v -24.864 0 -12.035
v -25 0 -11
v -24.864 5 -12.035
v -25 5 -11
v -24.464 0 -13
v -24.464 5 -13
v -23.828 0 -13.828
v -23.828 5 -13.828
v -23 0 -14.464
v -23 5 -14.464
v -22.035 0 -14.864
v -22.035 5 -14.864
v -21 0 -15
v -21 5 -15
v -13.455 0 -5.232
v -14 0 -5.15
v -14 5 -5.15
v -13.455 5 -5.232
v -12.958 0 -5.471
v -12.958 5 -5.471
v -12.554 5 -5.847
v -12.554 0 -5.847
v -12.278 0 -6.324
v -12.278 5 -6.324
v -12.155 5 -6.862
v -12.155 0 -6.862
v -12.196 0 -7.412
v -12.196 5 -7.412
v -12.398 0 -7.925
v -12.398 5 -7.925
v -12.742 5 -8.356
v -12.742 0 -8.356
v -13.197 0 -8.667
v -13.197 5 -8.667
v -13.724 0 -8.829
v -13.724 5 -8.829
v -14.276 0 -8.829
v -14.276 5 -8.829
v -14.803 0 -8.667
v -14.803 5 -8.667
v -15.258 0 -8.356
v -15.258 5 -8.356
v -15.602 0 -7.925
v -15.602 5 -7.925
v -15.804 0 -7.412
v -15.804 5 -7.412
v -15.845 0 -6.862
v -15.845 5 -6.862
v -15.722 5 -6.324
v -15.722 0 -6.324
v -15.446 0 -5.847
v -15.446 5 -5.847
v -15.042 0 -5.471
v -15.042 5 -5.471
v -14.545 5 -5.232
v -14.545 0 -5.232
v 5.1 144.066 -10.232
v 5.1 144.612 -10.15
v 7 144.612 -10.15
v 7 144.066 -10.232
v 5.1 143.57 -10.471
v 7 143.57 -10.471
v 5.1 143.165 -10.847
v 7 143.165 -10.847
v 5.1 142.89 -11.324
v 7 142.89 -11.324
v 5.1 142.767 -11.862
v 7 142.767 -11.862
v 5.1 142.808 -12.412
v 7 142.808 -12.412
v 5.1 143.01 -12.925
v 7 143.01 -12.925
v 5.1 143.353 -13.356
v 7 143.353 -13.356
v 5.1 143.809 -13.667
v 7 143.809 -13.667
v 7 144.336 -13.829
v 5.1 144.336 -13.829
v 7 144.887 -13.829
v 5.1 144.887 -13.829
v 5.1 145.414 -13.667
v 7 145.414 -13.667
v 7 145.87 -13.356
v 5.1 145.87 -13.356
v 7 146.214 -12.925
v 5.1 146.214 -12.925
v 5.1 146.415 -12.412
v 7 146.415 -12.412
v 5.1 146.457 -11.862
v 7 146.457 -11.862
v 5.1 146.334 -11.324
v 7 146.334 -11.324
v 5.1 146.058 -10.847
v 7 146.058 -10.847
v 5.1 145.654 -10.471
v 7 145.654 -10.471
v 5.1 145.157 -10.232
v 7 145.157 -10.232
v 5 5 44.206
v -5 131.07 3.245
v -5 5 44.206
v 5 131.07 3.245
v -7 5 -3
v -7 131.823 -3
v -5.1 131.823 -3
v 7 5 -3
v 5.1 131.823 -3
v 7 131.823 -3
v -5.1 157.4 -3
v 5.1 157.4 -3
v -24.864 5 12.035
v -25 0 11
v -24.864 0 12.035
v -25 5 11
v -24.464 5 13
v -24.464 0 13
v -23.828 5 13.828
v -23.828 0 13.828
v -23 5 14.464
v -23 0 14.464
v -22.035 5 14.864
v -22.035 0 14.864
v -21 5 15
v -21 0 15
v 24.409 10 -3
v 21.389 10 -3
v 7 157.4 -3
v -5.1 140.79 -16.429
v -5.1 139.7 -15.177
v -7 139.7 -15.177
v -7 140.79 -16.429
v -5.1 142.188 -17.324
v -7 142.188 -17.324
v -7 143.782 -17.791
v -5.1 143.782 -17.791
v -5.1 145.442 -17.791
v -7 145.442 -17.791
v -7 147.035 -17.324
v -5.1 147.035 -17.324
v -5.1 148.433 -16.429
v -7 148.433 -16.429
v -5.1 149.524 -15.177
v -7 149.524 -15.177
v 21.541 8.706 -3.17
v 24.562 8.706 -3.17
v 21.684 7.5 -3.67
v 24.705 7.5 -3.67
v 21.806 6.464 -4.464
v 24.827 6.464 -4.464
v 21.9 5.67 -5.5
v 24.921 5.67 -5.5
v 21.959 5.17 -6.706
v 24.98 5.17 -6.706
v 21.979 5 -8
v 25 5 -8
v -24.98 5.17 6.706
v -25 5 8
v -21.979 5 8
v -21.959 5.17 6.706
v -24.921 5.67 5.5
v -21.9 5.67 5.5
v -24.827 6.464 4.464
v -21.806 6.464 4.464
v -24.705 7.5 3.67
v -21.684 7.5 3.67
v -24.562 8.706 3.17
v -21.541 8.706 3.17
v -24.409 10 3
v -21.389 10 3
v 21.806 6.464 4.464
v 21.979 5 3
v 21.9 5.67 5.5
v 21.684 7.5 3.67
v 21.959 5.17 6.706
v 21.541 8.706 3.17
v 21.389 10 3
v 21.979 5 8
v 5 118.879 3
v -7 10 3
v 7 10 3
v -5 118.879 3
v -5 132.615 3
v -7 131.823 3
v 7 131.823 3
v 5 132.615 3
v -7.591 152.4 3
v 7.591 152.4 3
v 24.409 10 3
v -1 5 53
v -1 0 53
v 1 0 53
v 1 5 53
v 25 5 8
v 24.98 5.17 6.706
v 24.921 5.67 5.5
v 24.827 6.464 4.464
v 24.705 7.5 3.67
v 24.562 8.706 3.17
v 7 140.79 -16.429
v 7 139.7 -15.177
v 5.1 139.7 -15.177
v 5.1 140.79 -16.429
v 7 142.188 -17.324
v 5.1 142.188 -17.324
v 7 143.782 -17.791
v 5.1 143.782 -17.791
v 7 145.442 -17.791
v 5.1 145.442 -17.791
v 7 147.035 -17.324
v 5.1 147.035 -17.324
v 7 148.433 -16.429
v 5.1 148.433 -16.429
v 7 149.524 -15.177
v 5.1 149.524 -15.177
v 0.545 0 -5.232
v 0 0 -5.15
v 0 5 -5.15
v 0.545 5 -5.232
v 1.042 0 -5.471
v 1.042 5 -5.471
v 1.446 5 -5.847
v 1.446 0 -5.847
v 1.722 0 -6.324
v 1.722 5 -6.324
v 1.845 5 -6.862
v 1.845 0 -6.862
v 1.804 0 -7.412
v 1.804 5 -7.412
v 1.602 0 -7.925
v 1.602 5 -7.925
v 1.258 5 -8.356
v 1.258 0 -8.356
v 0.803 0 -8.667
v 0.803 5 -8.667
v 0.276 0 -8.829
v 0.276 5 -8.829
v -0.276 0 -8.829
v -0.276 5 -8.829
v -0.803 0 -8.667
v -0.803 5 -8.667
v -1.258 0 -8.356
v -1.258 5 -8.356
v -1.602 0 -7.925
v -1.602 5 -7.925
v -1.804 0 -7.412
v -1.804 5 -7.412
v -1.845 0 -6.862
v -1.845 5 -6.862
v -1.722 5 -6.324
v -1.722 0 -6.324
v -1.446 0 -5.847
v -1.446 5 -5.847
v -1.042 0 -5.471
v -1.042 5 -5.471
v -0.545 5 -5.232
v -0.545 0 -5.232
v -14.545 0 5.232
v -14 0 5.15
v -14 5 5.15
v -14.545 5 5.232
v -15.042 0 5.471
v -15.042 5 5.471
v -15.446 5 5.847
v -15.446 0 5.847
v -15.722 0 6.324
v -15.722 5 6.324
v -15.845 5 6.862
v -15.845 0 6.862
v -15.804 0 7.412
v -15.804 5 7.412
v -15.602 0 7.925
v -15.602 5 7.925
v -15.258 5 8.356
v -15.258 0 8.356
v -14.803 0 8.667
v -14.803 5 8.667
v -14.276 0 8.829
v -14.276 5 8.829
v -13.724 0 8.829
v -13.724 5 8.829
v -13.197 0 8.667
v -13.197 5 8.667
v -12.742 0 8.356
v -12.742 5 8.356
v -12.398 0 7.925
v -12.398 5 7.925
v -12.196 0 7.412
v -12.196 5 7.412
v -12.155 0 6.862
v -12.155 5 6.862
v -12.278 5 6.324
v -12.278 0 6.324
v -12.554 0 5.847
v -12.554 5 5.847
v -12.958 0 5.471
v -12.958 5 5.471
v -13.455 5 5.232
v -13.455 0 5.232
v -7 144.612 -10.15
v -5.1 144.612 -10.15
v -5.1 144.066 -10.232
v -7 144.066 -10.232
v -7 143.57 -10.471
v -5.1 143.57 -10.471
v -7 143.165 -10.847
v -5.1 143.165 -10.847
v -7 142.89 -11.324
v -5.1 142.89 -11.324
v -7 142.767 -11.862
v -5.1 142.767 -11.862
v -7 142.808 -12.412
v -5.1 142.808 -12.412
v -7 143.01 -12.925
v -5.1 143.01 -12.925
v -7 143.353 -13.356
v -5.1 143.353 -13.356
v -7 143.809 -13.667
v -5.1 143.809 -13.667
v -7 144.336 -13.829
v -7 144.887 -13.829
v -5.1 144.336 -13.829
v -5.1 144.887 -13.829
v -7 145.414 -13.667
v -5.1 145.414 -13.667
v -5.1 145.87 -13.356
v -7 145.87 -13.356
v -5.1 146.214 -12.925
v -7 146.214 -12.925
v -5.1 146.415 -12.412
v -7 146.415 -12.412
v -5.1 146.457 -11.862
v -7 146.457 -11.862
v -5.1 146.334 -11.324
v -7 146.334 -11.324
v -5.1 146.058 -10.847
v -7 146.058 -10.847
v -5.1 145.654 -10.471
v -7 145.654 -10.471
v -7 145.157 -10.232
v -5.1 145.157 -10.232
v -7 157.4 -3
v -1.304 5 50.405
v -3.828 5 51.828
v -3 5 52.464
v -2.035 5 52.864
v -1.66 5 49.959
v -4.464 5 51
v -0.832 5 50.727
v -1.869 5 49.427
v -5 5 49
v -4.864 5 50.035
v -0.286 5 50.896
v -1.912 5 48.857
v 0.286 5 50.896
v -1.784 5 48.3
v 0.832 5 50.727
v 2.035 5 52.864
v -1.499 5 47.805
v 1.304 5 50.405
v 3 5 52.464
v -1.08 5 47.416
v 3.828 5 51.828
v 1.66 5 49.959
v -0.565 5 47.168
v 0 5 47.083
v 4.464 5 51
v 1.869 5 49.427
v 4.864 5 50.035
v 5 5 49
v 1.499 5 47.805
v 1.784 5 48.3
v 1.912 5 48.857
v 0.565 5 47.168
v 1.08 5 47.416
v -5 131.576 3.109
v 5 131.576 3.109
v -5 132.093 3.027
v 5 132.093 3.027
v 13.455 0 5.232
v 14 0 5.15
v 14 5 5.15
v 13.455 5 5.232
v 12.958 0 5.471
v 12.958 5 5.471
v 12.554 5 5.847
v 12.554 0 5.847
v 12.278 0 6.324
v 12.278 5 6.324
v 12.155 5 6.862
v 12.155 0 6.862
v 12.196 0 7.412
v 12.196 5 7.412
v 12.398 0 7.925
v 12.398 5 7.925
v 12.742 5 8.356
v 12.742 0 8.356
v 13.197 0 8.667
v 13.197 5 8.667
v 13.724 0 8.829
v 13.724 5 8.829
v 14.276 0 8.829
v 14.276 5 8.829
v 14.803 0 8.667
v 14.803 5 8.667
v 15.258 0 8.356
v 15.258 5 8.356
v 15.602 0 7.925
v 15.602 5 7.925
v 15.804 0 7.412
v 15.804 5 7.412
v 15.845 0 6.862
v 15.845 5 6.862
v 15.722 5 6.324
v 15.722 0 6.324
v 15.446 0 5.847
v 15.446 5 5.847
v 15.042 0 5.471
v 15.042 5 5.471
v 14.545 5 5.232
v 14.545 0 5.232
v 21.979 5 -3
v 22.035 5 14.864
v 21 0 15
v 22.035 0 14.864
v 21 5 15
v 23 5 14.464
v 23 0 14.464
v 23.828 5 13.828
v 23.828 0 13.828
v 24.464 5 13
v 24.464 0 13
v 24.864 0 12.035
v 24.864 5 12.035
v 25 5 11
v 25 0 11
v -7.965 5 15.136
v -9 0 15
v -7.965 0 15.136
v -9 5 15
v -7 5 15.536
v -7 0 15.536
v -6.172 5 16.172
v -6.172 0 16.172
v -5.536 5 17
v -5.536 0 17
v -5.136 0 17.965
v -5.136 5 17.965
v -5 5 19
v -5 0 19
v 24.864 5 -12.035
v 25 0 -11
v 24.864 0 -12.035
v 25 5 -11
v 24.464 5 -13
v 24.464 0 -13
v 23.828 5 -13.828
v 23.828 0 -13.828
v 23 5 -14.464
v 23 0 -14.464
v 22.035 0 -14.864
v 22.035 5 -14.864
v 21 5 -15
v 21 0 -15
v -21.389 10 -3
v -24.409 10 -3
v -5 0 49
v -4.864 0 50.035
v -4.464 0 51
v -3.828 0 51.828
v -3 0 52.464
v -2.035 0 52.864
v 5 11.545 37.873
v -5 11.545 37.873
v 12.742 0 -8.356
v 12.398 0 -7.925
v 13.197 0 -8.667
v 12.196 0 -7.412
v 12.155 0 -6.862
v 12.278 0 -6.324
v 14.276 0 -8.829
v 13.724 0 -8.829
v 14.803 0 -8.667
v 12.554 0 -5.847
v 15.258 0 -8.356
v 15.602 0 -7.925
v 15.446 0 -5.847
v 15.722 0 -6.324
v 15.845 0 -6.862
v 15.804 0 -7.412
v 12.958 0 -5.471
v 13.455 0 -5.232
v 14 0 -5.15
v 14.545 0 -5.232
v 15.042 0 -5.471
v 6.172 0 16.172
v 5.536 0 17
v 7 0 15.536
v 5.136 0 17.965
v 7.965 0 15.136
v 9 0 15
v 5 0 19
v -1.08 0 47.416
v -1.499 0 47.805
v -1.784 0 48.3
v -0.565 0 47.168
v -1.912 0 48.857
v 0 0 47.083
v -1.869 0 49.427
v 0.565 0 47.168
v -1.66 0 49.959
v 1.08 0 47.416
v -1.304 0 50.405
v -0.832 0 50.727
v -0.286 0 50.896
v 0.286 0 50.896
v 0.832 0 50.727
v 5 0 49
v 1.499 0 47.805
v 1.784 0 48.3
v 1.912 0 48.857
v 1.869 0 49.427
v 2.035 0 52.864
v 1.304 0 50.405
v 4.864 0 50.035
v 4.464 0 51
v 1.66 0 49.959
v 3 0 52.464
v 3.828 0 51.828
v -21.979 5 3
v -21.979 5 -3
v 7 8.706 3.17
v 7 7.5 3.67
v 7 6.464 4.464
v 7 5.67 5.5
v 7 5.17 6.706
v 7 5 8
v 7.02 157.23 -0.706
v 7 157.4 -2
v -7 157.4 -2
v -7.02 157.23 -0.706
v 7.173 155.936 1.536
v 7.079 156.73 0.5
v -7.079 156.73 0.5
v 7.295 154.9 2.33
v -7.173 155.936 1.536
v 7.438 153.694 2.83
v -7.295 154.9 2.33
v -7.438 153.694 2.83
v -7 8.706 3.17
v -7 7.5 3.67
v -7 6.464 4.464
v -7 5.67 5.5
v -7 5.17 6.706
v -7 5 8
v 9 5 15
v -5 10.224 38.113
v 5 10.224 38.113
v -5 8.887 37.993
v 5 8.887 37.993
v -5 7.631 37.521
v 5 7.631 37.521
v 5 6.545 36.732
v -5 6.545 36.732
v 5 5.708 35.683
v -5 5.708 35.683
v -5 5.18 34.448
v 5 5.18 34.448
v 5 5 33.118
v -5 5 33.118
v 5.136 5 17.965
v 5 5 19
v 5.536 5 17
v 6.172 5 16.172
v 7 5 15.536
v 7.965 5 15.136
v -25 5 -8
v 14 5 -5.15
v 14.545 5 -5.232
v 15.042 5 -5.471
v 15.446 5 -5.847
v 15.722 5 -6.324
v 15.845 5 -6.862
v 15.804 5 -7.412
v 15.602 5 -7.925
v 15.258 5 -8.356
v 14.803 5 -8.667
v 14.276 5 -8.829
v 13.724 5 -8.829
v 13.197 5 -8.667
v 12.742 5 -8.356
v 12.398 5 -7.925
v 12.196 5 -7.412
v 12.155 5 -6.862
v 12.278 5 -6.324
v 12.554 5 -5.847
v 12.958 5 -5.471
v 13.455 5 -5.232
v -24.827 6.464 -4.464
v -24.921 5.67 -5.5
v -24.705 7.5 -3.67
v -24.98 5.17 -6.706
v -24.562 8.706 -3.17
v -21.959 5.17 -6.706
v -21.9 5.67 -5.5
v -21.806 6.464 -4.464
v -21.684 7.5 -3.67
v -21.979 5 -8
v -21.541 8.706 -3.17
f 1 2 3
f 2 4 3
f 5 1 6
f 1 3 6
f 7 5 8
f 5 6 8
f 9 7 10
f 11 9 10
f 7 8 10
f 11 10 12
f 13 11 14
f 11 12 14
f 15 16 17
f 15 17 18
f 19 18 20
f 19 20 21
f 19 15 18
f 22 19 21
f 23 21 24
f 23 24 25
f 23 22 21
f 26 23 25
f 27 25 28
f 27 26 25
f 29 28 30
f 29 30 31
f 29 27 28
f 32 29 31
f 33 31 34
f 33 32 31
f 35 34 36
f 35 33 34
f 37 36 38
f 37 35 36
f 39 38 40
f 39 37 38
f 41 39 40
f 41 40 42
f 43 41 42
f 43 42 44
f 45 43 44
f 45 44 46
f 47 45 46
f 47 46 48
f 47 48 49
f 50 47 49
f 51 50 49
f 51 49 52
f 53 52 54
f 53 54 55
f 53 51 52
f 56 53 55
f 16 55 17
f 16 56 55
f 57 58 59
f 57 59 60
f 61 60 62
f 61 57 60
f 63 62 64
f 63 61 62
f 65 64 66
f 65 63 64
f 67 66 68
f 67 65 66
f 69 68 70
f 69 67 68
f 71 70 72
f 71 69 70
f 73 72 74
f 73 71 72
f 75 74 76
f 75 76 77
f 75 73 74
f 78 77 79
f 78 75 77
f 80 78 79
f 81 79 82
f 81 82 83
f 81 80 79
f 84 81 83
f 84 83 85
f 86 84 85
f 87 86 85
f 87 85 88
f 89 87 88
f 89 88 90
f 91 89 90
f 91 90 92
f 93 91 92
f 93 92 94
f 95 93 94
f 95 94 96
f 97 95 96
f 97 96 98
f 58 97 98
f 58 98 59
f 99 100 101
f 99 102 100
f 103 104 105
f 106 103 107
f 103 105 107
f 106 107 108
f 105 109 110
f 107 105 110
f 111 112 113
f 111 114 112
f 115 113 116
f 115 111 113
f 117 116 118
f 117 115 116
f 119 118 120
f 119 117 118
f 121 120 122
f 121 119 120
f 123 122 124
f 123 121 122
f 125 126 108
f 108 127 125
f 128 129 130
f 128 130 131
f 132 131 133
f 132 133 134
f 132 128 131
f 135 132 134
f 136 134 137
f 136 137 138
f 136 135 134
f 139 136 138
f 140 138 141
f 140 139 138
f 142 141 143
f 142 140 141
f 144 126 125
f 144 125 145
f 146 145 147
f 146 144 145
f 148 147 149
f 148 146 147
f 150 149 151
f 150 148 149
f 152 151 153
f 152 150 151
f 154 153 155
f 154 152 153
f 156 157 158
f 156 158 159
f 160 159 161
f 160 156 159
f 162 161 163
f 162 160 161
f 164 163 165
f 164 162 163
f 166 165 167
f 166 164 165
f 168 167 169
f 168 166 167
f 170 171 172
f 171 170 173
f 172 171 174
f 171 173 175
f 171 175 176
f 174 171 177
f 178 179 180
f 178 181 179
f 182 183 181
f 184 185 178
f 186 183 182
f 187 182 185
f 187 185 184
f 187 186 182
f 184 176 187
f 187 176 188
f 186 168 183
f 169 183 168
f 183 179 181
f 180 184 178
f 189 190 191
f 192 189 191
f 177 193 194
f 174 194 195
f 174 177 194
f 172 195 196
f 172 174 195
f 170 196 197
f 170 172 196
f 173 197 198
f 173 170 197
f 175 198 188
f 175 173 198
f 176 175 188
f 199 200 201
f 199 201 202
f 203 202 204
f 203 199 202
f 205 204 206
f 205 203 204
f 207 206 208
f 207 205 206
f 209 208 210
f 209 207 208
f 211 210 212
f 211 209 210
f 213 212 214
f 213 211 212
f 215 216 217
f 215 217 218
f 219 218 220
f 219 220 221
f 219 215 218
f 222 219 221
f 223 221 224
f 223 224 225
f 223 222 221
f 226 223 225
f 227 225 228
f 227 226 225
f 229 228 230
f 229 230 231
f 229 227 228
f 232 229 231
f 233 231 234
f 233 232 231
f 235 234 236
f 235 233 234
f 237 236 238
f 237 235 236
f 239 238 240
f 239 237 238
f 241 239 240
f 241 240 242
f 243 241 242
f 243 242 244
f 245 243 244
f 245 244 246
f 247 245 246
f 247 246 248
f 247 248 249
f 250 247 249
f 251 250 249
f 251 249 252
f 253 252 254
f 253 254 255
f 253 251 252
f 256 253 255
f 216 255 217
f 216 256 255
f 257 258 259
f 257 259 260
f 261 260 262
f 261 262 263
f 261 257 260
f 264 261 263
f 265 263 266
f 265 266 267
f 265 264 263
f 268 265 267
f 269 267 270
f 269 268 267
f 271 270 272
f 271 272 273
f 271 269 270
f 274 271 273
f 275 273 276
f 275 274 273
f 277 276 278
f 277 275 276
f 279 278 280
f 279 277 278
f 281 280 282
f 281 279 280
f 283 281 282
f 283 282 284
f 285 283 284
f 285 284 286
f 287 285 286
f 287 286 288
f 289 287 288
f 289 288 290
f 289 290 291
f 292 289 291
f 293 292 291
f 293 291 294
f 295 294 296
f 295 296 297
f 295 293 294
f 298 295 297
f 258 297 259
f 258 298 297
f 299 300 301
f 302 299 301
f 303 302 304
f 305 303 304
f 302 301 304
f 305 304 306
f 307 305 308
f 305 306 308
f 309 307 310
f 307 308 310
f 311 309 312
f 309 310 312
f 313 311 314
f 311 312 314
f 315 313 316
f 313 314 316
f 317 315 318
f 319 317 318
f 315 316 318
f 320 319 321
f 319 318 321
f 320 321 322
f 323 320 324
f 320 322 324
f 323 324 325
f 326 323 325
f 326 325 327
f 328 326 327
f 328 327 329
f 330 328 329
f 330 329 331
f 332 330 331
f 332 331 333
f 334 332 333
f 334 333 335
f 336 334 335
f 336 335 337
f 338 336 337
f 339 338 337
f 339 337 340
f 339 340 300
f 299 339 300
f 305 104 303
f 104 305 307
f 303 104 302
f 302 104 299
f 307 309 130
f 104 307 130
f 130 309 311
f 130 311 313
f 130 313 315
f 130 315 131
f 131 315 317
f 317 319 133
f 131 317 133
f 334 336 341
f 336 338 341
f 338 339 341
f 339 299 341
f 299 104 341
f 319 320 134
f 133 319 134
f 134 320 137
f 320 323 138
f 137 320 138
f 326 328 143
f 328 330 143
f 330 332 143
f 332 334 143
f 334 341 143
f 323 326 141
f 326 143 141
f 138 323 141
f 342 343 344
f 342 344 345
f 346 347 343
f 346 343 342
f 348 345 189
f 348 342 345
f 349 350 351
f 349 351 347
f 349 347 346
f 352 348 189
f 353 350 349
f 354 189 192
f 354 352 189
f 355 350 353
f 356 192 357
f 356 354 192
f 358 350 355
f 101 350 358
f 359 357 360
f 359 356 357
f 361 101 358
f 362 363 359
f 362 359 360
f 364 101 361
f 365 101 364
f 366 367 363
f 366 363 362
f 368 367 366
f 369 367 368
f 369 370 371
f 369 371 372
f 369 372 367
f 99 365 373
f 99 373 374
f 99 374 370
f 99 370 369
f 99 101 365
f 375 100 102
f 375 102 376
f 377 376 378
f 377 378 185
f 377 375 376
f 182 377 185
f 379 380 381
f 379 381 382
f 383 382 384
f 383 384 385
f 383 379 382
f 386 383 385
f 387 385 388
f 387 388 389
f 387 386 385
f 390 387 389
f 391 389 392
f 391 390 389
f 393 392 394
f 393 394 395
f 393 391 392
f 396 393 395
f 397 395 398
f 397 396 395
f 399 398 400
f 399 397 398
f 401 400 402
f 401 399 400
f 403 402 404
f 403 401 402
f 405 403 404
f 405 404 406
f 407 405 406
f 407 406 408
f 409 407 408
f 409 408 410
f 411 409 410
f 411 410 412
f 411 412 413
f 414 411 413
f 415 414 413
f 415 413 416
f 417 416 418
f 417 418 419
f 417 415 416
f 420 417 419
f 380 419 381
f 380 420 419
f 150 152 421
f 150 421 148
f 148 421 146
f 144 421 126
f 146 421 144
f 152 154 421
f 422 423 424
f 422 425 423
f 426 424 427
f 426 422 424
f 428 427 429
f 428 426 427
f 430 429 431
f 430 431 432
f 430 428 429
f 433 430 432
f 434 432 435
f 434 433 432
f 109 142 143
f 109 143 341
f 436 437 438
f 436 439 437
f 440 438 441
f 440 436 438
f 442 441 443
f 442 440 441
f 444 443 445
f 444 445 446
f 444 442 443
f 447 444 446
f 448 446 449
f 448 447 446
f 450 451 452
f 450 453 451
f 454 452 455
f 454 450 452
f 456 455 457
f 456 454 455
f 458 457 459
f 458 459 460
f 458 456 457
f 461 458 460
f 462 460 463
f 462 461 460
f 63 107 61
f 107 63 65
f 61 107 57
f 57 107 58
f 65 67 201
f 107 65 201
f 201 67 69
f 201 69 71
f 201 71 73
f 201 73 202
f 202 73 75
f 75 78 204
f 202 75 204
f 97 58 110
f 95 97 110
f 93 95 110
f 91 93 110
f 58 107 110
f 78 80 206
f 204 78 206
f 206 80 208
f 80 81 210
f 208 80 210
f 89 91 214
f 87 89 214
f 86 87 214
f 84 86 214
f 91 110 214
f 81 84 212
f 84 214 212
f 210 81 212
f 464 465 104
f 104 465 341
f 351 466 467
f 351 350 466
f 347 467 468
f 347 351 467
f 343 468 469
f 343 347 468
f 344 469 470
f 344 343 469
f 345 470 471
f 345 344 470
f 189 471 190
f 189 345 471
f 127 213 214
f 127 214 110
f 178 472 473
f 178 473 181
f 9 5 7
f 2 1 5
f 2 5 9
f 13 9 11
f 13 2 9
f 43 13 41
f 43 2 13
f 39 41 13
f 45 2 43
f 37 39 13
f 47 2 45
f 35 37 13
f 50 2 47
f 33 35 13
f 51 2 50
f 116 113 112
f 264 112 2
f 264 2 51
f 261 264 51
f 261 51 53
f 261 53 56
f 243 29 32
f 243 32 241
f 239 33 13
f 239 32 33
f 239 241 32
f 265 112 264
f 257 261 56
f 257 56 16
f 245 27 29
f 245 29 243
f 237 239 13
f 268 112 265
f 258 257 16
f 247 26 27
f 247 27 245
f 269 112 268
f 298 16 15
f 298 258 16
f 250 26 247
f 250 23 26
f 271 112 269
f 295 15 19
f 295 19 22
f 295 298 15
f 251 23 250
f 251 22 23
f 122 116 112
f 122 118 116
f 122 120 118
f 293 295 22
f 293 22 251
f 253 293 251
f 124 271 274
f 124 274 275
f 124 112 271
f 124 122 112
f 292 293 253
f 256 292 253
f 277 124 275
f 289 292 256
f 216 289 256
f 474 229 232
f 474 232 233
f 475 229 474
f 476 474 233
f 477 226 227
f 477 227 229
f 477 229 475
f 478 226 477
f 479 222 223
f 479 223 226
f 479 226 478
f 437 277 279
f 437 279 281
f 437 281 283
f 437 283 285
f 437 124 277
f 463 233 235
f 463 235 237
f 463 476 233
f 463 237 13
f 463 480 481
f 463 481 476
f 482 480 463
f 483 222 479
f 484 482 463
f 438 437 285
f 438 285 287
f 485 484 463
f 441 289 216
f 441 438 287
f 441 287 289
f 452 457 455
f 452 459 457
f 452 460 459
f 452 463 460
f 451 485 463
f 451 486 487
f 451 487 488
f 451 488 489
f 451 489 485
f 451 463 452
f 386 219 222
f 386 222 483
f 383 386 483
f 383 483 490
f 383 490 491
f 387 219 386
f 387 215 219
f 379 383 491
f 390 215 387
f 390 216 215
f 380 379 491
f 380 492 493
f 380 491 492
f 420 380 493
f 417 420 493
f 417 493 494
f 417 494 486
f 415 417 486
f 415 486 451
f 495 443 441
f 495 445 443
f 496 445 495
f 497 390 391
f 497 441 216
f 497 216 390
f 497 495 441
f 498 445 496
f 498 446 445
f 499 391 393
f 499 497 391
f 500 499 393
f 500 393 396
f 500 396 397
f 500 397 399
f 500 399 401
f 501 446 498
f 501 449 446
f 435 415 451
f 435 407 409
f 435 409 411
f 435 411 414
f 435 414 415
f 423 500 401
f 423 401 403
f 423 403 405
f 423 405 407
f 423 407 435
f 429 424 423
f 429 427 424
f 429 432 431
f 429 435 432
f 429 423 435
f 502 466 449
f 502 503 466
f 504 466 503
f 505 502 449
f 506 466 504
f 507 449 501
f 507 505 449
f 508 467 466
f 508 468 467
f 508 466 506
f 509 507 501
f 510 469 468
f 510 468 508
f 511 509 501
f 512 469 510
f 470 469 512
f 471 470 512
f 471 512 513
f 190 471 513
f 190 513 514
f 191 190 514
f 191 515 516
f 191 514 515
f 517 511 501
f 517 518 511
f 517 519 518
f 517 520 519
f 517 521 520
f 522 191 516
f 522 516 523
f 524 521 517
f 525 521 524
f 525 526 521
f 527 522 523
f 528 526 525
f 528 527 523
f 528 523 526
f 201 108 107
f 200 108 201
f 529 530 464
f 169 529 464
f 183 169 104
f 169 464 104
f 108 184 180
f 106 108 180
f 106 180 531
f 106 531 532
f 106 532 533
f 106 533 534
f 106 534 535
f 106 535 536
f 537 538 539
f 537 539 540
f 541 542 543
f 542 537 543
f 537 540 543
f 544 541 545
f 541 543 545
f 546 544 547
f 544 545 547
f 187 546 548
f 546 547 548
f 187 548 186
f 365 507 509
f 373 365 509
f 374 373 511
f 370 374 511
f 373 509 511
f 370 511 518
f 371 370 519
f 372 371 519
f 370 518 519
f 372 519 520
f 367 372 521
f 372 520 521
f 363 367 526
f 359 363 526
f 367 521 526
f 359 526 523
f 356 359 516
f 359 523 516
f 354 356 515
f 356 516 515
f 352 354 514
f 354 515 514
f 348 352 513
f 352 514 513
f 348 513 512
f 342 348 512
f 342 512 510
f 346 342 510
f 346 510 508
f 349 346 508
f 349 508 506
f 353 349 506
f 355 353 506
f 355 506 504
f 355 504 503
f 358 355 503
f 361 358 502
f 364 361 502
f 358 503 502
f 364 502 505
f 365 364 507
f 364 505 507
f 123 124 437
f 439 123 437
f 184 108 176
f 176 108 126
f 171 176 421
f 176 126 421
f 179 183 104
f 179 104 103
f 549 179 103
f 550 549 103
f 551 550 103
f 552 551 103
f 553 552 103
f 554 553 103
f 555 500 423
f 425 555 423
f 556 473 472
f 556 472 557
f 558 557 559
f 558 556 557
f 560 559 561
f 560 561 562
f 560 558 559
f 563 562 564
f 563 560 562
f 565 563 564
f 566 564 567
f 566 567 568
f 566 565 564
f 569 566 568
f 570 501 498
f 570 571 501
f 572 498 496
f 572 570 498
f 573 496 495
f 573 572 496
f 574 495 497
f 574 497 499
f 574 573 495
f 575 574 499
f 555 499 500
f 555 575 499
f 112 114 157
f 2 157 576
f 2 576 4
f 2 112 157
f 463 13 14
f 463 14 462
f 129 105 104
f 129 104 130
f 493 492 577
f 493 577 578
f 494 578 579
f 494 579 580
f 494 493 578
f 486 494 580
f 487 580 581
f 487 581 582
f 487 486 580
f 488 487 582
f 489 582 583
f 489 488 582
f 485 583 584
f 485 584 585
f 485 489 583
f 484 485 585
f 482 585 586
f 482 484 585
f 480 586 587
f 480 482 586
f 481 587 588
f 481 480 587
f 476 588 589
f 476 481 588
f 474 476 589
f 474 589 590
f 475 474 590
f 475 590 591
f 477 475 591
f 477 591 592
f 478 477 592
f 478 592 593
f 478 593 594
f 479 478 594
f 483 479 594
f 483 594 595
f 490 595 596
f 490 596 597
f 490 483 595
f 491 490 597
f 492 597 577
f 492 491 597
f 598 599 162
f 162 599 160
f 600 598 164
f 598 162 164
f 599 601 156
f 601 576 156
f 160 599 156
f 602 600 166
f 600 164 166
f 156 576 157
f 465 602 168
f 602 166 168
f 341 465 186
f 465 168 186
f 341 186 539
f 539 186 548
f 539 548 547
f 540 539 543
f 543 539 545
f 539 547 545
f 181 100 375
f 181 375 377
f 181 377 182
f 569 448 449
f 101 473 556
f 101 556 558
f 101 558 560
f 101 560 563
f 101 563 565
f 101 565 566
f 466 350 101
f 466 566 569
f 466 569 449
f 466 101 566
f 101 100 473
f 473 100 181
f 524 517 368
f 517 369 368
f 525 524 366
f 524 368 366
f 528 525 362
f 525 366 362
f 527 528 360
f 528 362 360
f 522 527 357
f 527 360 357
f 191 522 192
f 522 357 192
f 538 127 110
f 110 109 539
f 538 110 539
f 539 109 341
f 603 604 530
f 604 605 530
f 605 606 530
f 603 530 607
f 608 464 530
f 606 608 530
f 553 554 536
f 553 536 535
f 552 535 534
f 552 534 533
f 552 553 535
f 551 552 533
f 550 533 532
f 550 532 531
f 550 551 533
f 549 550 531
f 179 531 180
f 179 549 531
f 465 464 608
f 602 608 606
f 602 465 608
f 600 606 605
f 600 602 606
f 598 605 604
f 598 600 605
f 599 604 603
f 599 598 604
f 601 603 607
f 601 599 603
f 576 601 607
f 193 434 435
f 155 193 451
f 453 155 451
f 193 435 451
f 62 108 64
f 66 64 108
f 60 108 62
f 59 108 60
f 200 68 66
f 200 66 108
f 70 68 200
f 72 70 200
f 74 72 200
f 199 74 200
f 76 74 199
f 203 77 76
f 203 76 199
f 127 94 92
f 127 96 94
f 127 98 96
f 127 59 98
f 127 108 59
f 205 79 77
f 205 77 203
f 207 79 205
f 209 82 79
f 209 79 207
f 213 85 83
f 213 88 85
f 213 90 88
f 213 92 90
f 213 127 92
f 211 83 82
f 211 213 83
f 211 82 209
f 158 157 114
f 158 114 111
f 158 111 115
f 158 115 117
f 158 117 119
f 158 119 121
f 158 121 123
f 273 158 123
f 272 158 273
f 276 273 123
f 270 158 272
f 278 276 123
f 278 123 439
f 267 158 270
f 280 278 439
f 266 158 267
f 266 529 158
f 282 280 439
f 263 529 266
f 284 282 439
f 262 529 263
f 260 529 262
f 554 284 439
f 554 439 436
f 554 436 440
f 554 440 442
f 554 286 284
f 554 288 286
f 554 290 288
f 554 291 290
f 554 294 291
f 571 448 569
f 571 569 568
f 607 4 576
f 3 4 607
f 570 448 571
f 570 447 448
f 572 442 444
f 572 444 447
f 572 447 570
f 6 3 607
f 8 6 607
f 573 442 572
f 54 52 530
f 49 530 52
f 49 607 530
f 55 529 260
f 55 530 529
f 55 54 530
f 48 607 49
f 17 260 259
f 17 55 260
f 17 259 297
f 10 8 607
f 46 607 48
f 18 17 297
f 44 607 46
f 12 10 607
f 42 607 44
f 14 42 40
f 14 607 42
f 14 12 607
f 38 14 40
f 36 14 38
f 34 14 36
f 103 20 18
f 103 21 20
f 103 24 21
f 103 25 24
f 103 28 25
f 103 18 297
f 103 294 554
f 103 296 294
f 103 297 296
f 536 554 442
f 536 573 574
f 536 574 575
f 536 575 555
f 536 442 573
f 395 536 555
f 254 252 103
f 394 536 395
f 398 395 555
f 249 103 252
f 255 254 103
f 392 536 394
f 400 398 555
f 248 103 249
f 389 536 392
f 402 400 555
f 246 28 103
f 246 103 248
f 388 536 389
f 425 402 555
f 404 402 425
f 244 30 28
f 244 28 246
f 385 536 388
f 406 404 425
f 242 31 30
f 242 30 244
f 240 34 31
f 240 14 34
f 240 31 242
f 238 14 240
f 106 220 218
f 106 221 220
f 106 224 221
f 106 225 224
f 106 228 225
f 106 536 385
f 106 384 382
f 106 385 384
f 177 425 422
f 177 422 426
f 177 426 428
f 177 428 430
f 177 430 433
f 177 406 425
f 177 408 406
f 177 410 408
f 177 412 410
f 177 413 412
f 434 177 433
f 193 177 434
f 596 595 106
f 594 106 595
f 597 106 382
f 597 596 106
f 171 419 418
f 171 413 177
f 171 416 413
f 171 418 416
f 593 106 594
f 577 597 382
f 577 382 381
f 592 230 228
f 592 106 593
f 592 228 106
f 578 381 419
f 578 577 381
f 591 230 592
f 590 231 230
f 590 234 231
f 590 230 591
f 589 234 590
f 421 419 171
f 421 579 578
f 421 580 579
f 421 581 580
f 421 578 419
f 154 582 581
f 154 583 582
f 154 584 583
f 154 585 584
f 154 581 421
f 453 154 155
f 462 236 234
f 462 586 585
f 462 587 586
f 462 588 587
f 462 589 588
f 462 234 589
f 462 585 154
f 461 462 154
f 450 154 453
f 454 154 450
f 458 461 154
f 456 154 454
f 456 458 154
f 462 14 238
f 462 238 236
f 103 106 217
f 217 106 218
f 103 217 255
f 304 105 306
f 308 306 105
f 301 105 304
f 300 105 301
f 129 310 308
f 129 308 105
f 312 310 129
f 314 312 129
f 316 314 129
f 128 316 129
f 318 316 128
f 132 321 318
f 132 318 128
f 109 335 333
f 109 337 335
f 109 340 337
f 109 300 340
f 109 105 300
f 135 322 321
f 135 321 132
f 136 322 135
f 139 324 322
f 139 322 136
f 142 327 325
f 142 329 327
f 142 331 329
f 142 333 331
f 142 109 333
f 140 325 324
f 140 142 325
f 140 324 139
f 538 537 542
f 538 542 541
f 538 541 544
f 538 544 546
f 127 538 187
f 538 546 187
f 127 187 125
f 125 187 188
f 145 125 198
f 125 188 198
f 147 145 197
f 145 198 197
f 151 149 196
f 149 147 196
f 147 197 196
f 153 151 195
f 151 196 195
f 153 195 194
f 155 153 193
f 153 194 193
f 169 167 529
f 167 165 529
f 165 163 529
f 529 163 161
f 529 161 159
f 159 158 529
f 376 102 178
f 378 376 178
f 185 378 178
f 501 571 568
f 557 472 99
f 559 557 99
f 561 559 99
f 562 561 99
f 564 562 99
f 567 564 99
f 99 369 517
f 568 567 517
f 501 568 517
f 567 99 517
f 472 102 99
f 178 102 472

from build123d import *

# Parameters (mm, degrees)
SKETCH1_W                       = 50
SKETCH1_H                       = 30
SKETCH1_R                       = 1.85
BOSS_EXTRUDE1_DEPTH             = 5
BOSS_EXTRUDE2_DEPTH             = 3
BOSS_EXTRUDE2_DEPTH_BACK        = 3
SKETCH4_R                       = 1.85
BOSS_EXTRUDE3_DEPTH             = 7
CUT_EXTRUDE1_REACH              = 162.37
SKETCH6_W                       = 10.2
SKETCH6_H                       = 14.85
SKETCH8_R                       = 1.85
SKETCH8_W                       = 10
SKETCH8_H                       = 38
SKETCH8_R_2                     = 1.917002372
BOSS_EXTRUDE4_DEPTH             = 5
BOSS_EXTRUDE5_REACH             = 169.955
BOSS_EXTRUDE5_DIRECTION_2_REACH = 169.955
FILLET1_R                       = 5
FILLET2_R                       = 4


with BuildPart() as part:
    # Sketch1 → Boss-Extrude1 (new body)
    with BuildSketch(Plane(origin=(0, 0, 0), x_dir=(1, 0, 0), z_dir=(0, 1, 0))):
        Rectangle(SKETCH1_W, SKETCH1_H)
        with Locations(Location((0, 7, 0), (0, 0, 270))):
            Circle(SKETCH1_R, mode=Mode.SUBTRACT)
        with Locations(Location((14, 7, 0), (0, 0, 270))):
            Circle(SKETCH1_R, mode=Mode.SUBTRACT)
        with Locations(Location((-14, 7, 0), (0, 0, 270))):
            Circle(SKETCH1_R, mode=Mode.SUBTRACT)
        with Locations(Location((14, -7, 0), (0, 0, 90))):
            Circle(SKETCH1_R, mode=Mode.SUBTRACT)
        with Locations(Location((0, -7, 0), (0, 0, 90))):
            Circle(SKETCH1_R, mode=Mode.SUBTRACT)
        with Locations(Location((-14, -7, 0), (0, 0, 90))):
            Circle(SKETCH1_R, mode=Mode.SUBTRACT)
    extrude(amount=BOSS_EXTRUDE1_DEPTH)

    # Sketch3 → Boss-Extrude2 (add, two sides: drawn at the far end of the back side and taken through both)
    with BuildSketch(Plane.XY.offset(-BOSS_EXTRUDE2_DEPTH_BACK)):
        Polygon((-7, 157.4), (-25, 5), (-21.97914743, 5), (-7, 131.823448239), align=None)
        Polygon((25, 5), (7, 157.4), (7, 131.823448239), (21.97914743, 5), align=None)
        Polygon((0, 157.4), (-7, 157.4), (-7, 131.823448239), (-7, 5), (0, 5), align=None)
        Polygon((7, 157.4), (0, 157.4), (0, 5), (7, 5), (7, 131.823448239), align=None)
    extrude(amount=BOSS_EXTRUDE2_DEPTH + BOSS_EXTRUDE2_DEPTH_BACK)

    # Sketch4 → Boss-Extrude3 (add)
    with BuildSketch(Plane(origin=(0, 0, 0), x_dir=(0, 0, -1), z_dir=(1, 0, 0))):
        with BuildLine():
            Line((3, 131.823448239), (15.177137146, 139.699667569))
            ThreePointArc((15.177137146, 139.699667569), (17.85, 144.611724119), (15.177137146, 149.52378067))
            Line((15.177137146, 149.52378067), (3, 157.4))
            Line((3, 157.4), (3, 131.823448239))
        make_face()
        with Locations(Location((12, 144.611724119, 0), (0, 0, 180))):
            Circle(SKETCH4_R, mode=Mode.SUBTRACT)
    boss_extrude3 = extrude(amount=BOSS_EXTRUDE3_DEPTH)

    # Mirror1: Boss-Extrude3 across plane
    add(boss_extrude3.mirror(Plane(origin=(0, 0, 0), x_dir=(0, 0, 1), z_dir=(1, 0, 0))))

    # Cut-Extrude1: up to this plane
    cut_extrude1_end = Plane(origin=(7, 91.572994836, 59.229766685), z_dir=(0, 0.8396677864426271, 0.5431003667928599))
    # Sketch6 → Cut-Extrude1 (cut, up to the surface)
    with BuildSketch(Plane(origin=(0, 157.4, 0), x_dir=(1, 0, 0), z_dir=(0, 1, 0)), mode=Mode.PRIVATE) as cut_extrude1_sk1:
        with Locations((0, 10.425)):
            Rectangle(SKETCH6_W, SKETCH6_H)
    cut_extrude1_tool1 = split(extrude(cut_extrude1_sk1.sketch, amount=-CUT_EXTRUDE1_REACH, mode=Mode.PRIVATE), bisect_by=cut_extrude1_end, keep=Keep.BOTH, mode=Mode.PRIVATE)
    add(cut_extrude1_tool1.solids().sort_by_distance((0, 157.4, -10.425))[0], mode=Mode.SUBTRACT)

    # Sketch8 → Boss-Extrude4 (add)
    # profile 1 of 2: a face of its own
    with BuildSketch(Plane.XZ):
        with Locations((0, 7)):
            Circle(SKETCH8_R)
    # profile 2 of 2: a face of its own
    with BuildSketch(Plane.XZ):
        with Locations((0, 34)):
            Rectangle(SKETCH8_W, SKETCH8_H)
        with Locations(Location((0, 49, 0), (0, 0, 270))):
            Circle(SKETCH8_R_2, mode=Mode.SUBTRACT)
    extrude(amount=-BOSS_EXTRUDE4_DEPTH)

    # Boss-Extrude5: up to this face of the body (flat: up to its plane)
    boss_extrude5_end = Plane(part.part.faces().sort_by_distance((5, 2.5, 34))[0])
    # Sketch9 → Boss-Extrude5 (add, up to the picked face)
    with BuildSketch(Plane(origin=(0, 0, 0), x_dir=(0, 0, -1), z_dir=(1, 0, 0)), mode=Mode.PRIVATE) as boss_extrude5_sk1:
        Polygon((-3, 131.823448239), (-44.205833274, 5), (-40, 5), (-3, 118.878720851), align=None)
    boss_extrude5_tool1 = split(extrude(boss_extrude5_sk1.sketch, amount=BOSS_EXTRUDE5_REACH, mode=Mode.PRIVATE), bisect_by=boss_extrude5_end, keep=Keep.BOTH, mode=Mode.PRIVATE)
    add(boss_extrude5_tool1.solids().sort_by(Axis((0, 65.233555, 22.570307), (1, 0, 0)))[0])

    # Boss-Extrude5 direction 2: up to this face of the body (flat: up to its plane)
    boss_extrude5_direction_2_end = Plane(part.part.faces().sort_by_distance((-5, 2.5, 34))[0])
    # Sketch9 → Boss-Extrude5 direction 2 (add, up to the picked face)
    with BuildSketch(Plane(origin=(0, 0, 0), x_dir=(0, 0, -1), z_dir=(1, 0, 0)), mode=Mode.PRIVATE) as boss_extrude5_direction_2_sk1:
        Polygon((-3, 131.823448239), (-44.205833274, 5), (-40, 5), (-3, 118.878720851), align=None)
    boss_extrude5_direction_2_tool1 = split(extrude(boss_extrude5_direction_2_sk1.sketch, amount=-BOSS_EXTRUDE5_DIRECTION_2_REACH, mode=Mode.PRIVATE), bisect_by=boss_extrude5_direction_2_end, keep=Keep.BOTH, mode=Mode.PRIVATE)
    add(boss_extrude5_direction_2_tool1.solids().sort_by(Axis((0, 65.233555, 22.570307), (-1, 0, 0)))[0])

    # Fillet1
    # the kernel refuses this fillet: 5 mm, written as the material it adds along each edge
    with BuildSketch(Plane(origin=(-5, 131.823448239, 3), x_dir=(0, -0.9510600491338266, 0.3090061212040359), z_dir=(1, 0, 0))) as fillet1_piece_1:
        with BuildLine():
            CenterArc((FILLET1_R * 0.158378580578, -FILLET1_R), FILLET1_R, 90, 17.999344954)
            Line((-FILLET1_R * 0.150627540626, -FILLET1_R * 0.0489399508662), (0, 0))
            Line((0, 0), (FILLET1_R * 0.158378580578, 0))
        make_face()
    extrude(amount=10)
    with BuildSketch(Plane(origin=(-5, 5, 40), x_dir=(0, 0.9510600491338281, -0.3090061212040312), z_dir=(1, 0, 0))) as fillet1_piece_2:
        with BuildLine():
            CenterArc((FILLET1_R * 1.37636537503, -FILLET1_R), FILLET1_R, 90, 107.999344954)
            Line((FILLET1_R * 0.425305325898, -FILLET1_R * 1.3090061212), (0, 0))
            Line((0, 0), (FILLET1_R * 1.37636537503, 0))
        make_face()
    extrude(amount=10)
    with BuildSketch(Plane(origin=(9.47914743, 5, 3), x_dir=(0, 1, 0), z_dir=(1, 0, 0))) as fillet1_piece_3_section:
        with BuildLine():
            CenterArc((FILLET1_R, FILLET1_R), FILLET1_R, 180, 90)
            Line((0, FILLET1_R), (0, 0))
            Line((0, 0), (FILLET1_R, 0))
        make_face()
    fillet1_piece_3 = extrude(amount=15.52085257, mode=Mode.PRIVATE)
    fillet1_piece_3 = split(fillet1_piece_3, bisect_by=Plane(origin=(21.86620474, 5.956248104, 4.13176941), z_dir=(0.9930971241558421, 0.11729493592391835, 0)), keep=Keep.TOP, mode=Mode.PRIVATE)
    fillet1_piece_3 = split(fillet1_piece_3, bisect_by=Plane(origin=(24.845496113, 6.308132911, 4.13176941), z_dir=(-0.9930971241558421, -0.11729493592391835, 0)), keep=Keep.TOP, mode=Mode.PRIVATE)
    add(fillet1_piece_3)
    with BuildSketch(Plane(origin=(-25, 5, -3), x_dir=(0, 1, 0), z_dir=(1, 0, 0))) as fillet1_piece_4_section:
        with BuildLine():
            CenterArc((FILLET1_R, -FILLET1_R), FILLET1_R, 90, 90)
            Line((0, -FILLET1_R), (0, 0))
            Line((0, 0), (FILLET1_R, 0))
        make_face()
    fillet1_piece_4 = extrude(amount=15.52085257, mode=Mode.PRIVATE)
    fillet1_piece_4 = split(fillet1_piece_4, bisect_by=Plane(origin=(-24.845496113, 6.308132911, -4.13176941), z_dir=(0.9930971241558421, -0.11729493592391835, 0)), keep=Keep.TOP, mode=Mode.PRIVATE)
    fillet1_piece_4 = split(fillet1_piece_4, bisect_by=Plane(origin=(-21.86620474, 5.956248104, -4.13176941), z_dir=(-0.9930971241558421, 0.11729493592391835, 0)), keep=Keep.TOP, mode=Mode.PRIVATE)
    add(fillet1_piece_4)
    with BuildSketch(Plane(origin=(9.47914743, 5, -3), x_dir=(0, 1, 0), z_dir=(1, 0, 0))) as fillet1_piece_5_section:
        with BuildLine():
            CenterArc((FILLET1_R, -FILLET1_R), FILLET1_R, 90, 90)
            Line((0, -FILLET1_R), (0, 0))
            Line((0, 0), (FILLET1_R, 0))
        make_face()
    fillet1_piece_5 = extrude(amount=15.52085257, mode=Mode.PRIVATE)
    fillet1_piece_5 = split(fillet1_piece_5, bisect_by=Plane(origin=(24.845496113, 6.308132911, -4.13176941), z_dir=(-0.9930971241558421, -0.11729493592391835, 0)), keep=Keep.TOP, mode=Mode.PRIVATE)
    fillet1_piece_5 = split(fillet1_piece_5, bisect_by=Plane(origin=(21.86620474, 5.956248104, -4.13176941), z_dir=(0.9930971241558421, 0.11729493592391835, 0)), keep=Keep.TOP, mode=Mode.PRIVATE)
    add(fillet1_piece_5)
    with BuildSketch(Plane(origin=(-25, 5, 3), x_dir=(0, 1, 0), z_dir=(1, 0, 0))) as fillet1_piece_6_section:
        with BuildLine():
            CenterArc((FILLET1_R, FILLET1_R), FILLET1_R, 180, 90)
            Line((0, FILLET1_R), (0, 0))
            Line((0, 0), (FILLET1_R, 0))
        make_face()
    fillet1_piece_6 = extrude(amount=15.52085257, mode=Mode.PRIVATE)
    fillet1_piece_6 = split(fillet1_piece_6, bisect_by=Plane(origin=(-24.845496113, 6.308132911, 4.13176941), z_dir=(0.9930971241558421, -0.11729493592391835, 0)), keep=Keep.TOP, mode=Mode.PRIVATE)
    fillet1_piece_6 = split(fillet1_piece_6, bisect_by=Plane(origin=(-21.86620474, 5.956248104, 4.13176941), z_dir=(-0.9930971241558421, 0.11729493592391835, 0)), keep=Keep.TOP, mode=Mode.PRIVATE)
    add(fillet1_piece_6)
    with BuildSketch(Plane(origin=(-7, 5, 3), x_dir=(0, 1, 0), z_dir=(1, 0, 0))) as fillet1_piece_7:
        with BuildLine():
            CenterArc((FILLET1_R, FILLET1_R), FILLET1_R, 180, 90)
            Line((0, FILLET1_R), (0, 0))
            Line((0, 0), (FILLET1_R, 0))
        make_face()
    extrude(amount=14)
    # the kernel refuses this fillet: 5 mm, written as the material it takes off along each edge
    with BuildSketch(Plane(origin=(-19.5, 157.4, 3), x_dir=(0, -1, 0), z_dir=(1, 0, 0))) as fillet1_2_piece_1:
        with BuildLine():
            CenterArc((FILLET1_R, FILLET1_R), FILLET1_R, 180, 90)
            Line((0, FILLET1_R), (0, 0))
            Line((0, 0), (FILLET1_R, 0))
        make_face()
    extrude(amount=39, mode=Mode.SUBTRACT)

    # Fillet2
    fillet2_edges = [part.edges().sort_by_distance(p)[0] for p in [
        (5, 2.5, 15),
        (5, 2.5, 53),
        (-5, 2.5, 53),
        (-5, 2.5, 15),
        (25, 2.5, 15),
        (-25, 2.5, 15),
        (-25, 2.5, -15),
        (25, 2.5, -15),
    ]]
    fillet(fillet2_edges, radius=FILLET2_R)


solid = part.part
